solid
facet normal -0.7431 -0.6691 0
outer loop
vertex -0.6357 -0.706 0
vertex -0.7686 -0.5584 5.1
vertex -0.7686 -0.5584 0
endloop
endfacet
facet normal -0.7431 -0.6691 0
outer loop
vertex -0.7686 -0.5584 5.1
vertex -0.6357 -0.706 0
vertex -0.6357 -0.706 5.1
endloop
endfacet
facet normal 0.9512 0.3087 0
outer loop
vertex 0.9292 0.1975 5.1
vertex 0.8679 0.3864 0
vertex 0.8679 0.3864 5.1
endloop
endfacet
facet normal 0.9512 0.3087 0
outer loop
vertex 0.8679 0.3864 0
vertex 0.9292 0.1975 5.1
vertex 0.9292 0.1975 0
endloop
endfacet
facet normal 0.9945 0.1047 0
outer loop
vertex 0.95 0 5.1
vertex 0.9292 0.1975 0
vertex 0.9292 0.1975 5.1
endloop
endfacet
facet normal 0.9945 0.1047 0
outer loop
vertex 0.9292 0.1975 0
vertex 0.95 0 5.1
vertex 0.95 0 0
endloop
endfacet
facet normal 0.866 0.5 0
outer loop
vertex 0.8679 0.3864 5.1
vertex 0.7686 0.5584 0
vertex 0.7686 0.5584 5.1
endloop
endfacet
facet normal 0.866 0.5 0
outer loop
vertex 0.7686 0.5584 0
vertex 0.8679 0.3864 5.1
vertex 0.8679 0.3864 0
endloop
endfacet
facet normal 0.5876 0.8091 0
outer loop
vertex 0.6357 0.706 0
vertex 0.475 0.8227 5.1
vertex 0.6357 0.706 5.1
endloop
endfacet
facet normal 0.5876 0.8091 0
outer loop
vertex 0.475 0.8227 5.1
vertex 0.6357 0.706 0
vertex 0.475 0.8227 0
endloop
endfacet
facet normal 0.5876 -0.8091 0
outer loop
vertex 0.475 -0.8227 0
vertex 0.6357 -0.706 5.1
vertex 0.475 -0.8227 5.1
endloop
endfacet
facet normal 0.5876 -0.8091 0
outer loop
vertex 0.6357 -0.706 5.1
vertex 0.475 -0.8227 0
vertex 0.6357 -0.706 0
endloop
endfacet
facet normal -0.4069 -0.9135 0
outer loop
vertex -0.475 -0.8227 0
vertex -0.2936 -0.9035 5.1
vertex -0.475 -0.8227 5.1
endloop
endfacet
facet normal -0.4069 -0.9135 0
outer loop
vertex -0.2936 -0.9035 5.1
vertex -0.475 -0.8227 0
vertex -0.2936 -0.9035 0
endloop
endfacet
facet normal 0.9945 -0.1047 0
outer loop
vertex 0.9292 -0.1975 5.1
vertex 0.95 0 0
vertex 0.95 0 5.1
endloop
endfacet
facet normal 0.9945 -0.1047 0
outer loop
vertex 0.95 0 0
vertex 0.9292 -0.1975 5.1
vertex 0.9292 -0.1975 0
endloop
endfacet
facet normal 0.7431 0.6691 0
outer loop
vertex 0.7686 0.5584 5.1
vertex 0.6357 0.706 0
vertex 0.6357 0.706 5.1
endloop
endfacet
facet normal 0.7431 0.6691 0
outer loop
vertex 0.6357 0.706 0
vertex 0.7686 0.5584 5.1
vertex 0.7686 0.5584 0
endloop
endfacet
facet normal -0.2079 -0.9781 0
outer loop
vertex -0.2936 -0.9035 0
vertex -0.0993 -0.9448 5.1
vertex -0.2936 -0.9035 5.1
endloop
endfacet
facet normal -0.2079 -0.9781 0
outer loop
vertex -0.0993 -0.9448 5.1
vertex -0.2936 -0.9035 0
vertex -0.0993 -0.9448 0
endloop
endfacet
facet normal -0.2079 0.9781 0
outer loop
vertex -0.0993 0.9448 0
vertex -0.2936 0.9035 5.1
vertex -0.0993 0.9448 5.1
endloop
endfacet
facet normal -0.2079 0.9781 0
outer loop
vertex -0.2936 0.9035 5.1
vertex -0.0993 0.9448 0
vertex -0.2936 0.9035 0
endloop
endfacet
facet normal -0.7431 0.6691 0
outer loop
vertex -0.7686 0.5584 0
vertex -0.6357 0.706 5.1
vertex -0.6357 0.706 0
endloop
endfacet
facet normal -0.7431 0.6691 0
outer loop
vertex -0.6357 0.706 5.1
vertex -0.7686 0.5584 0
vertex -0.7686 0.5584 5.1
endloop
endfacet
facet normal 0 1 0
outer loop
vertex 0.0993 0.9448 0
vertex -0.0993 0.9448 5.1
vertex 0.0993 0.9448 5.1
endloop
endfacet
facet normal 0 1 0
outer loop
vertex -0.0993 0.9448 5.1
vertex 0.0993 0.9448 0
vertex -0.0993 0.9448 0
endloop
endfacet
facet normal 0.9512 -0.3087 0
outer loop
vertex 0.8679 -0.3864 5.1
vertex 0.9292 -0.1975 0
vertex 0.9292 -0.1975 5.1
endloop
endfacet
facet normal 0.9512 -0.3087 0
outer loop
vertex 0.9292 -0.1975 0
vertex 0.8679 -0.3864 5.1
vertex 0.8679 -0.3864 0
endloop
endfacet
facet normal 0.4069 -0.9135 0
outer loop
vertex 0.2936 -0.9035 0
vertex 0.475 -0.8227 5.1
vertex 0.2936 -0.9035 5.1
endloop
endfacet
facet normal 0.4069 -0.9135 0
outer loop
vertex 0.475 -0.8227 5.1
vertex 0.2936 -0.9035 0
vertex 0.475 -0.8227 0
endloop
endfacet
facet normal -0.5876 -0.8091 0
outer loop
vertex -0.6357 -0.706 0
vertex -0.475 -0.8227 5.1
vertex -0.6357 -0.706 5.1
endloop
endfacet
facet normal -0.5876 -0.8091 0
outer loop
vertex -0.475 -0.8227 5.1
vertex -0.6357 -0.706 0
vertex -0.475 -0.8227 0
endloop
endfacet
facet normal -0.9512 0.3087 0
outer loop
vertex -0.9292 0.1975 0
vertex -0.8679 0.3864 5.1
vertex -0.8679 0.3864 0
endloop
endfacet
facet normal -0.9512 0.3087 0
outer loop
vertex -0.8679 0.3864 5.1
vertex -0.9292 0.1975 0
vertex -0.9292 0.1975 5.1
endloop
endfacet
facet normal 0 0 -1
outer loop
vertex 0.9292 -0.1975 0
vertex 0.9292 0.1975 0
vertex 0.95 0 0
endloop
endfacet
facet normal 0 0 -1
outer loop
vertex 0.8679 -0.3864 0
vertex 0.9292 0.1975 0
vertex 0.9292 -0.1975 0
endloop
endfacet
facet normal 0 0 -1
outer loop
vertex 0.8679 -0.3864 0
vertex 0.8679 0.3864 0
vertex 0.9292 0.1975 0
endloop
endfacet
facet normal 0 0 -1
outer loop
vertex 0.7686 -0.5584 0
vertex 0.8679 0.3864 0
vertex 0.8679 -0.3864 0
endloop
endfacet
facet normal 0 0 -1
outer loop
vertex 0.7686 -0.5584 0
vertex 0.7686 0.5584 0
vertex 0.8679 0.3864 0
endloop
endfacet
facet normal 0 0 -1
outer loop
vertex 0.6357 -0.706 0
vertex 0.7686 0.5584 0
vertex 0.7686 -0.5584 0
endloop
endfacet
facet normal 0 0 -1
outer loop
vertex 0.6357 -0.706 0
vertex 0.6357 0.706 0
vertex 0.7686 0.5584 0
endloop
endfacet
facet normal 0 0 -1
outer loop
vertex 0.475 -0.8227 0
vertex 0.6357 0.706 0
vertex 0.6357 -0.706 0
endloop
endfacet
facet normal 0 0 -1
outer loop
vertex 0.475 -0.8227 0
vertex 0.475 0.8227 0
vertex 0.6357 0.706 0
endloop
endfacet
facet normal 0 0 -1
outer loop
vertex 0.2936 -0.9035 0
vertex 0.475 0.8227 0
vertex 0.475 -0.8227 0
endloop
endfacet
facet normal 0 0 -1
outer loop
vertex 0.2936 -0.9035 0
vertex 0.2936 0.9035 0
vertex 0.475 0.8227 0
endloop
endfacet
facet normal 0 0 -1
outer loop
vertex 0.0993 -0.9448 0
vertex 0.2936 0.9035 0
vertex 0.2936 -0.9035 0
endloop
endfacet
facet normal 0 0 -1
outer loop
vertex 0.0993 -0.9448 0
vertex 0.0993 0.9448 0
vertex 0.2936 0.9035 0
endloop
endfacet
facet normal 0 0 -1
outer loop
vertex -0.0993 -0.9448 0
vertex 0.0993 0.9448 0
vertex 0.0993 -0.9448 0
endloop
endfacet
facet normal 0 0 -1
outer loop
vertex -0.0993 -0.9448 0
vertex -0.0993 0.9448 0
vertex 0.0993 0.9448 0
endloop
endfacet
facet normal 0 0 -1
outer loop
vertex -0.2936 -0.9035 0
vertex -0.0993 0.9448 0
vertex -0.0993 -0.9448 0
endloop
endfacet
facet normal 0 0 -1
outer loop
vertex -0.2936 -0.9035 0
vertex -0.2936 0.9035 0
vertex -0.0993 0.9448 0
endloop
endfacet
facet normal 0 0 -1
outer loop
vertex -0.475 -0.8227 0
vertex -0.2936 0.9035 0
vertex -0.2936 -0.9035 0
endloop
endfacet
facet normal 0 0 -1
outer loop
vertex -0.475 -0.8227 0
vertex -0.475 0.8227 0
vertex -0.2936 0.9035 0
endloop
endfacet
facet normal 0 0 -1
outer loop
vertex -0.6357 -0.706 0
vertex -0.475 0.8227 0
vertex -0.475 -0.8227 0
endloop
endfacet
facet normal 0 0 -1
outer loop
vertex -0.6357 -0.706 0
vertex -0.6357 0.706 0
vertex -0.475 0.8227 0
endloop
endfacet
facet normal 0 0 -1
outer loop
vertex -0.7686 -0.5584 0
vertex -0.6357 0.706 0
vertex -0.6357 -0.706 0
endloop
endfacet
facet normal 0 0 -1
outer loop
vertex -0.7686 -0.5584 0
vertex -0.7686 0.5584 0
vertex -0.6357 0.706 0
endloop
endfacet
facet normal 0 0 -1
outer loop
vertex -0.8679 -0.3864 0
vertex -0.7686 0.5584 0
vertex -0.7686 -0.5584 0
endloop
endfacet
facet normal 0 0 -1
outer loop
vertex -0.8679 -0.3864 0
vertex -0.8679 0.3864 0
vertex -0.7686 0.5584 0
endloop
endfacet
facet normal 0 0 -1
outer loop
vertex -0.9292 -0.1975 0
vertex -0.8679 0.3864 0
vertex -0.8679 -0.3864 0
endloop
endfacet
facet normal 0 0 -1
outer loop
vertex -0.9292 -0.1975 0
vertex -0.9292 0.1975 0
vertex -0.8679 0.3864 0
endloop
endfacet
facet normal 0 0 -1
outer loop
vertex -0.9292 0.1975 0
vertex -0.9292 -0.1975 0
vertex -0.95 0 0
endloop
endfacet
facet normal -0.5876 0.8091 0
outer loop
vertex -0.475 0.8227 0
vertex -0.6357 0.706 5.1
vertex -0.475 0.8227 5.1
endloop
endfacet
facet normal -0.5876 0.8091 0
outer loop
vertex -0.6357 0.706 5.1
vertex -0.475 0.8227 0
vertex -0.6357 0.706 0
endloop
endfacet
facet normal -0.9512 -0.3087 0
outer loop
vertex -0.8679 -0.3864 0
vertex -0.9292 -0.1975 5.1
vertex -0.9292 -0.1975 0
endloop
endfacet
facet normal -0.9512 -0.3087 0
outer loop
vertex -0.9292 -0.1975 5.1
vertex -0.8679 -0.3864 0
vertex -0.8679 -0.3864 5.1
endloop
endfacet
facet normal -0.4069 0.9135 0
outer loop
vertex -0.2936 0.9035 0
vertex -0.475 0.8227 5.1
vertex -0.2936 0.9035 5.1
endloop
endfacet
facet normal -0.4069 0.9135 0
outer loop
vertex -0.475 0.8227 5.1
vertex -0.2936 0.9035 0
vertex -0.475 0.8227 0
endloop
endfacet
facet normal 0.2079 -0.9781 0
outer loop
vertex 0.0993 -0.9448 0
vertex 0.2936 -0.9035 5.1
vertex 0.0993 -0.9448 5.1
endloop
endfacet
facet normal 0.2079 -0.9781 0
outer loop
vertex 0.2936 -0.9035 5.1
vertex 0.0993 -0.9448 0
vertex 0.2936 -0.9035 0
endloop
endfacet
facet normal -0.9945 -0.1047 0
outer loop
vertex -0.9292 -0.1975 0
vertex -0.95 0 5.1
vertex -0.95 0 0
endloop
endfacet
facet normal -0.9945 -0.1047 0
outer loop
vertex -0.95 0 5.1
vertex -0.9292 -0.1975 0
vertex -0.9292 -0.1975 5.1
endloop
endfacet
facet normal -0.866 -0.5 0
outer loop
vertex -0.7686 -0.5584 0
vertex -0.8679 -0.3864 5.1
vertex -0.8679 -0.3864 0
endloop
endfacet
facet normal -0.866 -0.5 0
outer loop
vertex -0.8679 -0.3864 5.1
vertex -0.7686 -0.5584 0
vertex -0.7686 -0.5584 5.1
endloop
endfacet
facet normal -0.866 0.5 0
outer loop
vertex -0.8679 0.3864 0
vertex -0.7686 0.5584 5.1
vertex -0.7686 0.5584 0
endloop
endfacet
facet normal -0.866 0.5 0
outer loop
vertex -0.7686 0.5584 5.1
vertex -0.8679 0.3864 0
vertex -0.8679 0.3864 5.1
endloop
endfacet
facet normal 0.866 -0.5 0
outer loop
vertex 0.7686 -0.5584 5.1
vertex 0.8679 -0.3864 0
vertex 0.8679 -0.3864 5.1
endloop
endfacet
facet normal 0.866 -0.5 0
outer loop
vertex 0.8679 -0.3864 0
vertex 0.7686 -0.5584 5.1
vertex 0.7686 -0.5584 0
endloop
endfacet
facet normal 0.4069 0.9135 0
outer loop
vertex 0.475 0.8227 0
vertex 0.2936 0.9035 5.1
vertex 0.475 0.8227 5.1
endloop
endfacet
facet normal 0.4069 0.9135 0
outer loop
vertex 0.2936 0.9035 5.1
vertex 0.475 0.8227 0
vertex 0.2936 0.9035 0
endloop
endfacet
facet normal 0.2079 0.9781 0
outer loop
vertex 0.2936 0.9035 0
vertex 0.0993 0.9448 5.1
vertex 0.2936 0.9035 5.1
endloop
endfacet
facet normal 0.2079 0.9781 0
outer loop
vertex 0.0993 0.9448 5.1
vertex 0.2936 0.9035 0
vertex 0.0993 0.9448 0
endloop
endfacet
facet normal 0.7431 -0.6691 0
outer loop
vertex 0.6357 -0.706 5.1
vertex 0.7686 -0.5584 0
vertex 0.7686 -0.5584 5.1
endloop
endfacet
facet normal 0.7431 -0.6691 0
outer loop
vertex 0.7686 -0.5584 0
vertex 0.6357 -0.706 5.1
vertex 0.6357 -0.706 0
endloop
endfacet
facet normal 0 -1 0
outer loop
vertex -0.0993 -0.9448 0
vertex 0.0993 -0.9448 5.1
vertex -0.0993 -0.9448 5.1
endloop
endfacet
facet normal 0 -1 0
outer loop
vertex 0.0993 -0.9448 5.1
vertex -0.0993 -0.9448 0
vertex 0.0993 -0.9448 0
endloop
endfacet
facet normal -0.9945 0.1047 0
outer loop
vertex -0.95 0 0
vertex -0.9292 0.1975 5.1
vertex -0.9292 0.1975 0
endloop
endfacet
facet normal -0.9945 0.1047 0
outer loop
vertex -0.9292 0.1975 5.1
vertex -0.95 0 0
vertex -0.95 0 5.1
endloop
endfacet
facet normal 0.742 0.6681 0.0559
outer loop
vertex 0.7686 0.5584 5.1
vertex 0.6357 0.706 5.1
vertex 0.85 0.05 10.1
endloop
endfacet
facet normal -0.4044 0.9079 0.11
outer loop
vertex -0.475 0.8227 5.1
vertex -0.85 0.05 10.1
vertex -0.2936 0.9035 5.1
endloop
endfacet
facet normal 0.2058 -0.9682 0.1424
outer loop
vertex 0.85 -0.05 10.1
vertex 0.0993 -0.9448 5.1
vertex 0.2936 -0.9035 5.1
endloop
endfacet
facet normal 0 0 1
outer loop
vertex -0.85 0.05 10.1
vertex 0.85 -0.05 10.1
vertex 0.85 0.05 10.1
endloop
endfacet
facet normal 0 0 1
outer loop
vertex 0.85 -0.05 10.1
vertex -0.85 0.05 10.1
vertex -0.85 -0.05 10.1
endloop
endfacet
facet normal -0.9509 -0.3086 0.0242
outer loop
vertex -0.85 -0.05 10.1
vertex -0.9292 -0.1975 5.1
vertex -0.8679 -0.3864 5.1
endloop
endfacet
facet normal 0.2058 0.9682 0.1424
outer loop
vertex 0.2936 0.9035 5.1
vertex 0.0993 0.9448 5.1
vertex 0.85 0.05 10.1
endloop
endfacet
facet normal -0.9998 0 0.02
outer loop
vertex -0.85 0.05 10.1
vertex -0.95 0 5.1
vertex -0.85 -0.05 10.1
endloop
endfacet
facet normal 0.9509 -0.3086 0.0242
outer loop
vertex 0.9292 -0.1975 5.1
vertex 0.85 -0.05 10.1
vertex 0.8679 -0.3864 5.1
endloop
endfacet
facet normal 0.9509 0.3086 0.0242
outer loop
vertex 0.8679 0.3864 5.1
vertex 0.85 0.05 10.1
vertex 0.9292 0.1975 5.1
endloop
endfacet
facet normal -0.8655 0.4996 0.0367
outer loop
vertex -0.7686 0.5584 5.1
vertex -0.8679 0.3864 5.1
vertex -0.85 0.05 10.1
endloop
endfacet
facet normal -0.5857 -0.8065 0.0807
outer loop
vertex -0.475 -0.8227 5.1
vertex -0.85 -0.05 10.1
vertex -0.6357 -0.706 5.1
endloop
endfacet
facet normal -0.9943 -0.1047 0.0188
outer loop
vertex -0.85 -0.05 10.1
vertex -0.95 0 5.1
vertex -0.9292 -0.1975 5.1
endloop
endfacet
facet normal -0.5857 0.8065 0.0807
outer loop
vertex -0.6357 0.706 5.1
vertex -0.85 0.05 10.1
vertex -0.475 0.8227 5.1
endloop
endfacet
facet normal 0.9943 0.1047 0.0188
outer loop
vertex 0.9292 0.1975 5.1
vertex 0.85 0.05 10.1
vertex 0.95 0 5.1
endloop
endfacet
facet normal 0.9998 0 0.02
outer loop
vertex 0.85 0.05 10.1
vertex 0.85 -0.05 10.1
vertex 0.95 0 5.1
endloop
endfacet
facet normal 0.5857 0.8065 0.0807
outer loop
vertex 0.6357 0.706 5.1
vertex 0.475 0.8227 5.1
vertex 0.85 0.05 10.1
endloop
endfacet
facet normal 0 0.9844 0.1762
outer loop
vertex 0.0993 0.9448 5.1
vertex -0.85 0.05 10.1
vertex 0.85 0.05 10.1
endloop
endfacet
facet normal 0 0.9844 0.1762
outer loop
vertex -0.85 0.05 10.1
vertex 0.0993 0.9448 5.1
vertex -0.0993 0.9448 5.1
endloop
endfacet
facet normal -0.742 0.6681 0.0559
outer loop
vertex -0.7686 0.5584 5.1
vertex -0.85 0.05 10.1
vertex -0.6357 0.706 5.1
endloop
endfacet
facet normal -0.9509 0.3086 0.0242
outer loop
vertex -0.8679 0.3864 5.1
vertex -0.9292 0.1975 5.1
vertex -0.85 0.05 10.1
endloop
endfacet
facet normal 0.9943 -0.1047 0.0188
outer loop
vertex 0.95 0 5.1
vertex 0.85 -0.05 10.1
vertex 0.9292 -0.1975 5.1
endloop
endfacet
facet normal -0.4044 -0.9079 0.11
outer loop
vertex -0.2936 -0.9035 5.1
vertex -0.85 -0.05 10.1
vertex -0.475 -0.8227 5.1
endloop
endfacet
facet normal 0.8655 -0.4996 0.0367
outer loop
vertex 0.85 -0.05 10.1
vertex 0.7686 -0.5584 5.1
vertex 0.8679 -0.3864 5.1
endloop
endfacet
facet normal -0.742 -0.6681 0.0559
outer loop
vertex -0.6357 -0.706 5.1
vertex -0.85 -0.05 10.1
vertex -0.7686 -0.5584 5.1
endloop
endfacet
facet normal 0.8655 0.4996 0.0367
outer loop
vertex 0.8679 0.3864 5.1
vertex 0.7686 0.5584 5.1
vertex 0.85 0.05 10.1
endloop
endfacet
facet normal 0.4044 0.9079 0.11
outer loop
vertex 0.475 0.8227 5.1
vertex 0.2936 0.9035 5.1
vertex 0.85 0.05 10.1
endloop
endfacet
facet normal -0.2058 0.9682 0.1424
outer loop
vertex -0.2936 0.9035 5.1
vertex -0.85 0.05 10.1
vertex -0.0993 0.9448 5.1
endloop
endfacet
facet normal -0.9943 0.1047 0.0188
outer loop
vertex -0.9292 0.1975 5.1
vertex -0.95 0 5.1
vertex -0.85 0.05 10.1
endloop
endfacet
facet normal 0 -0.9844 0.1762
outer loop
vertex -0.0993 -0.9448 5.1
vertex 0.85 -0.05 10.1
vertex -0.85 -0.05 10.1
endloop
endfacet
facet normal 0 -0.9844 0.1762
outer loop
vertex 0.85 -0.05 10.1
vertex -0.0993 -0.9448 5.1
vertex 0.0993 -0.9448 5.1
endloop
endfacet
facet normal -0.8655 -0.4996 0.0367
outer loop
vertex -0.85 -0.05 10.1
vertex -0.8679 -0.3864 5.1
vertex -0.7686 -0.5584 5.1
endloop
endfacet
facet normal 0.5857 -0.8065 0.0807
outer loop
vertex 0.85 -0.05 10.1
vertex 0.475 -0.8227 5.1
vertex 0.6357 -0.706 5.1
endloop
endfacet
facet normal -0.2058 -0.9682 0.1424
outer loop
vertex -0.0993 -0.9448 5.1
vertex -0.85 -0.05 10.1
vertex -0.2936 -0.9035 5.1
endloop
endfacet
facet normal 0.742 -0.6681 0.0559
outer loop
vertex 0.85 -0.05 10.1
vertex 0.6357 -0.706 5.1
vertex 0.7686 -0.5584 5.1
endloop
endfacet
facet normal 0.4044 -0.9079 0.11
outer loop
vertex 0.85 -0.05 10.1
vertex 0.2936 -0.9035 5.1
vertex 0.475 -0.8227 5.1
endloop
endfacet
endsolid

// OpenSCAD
cylinder(r=0.95,h=5,$fn=30);
translate([0,0,5]) {
  hull() {
    cylinder(r=0.95,h=0.1,$fn=30);
    translate([-0.85,-0.05,5]) cube([1.7,0.1,0.1]);
  }
}
